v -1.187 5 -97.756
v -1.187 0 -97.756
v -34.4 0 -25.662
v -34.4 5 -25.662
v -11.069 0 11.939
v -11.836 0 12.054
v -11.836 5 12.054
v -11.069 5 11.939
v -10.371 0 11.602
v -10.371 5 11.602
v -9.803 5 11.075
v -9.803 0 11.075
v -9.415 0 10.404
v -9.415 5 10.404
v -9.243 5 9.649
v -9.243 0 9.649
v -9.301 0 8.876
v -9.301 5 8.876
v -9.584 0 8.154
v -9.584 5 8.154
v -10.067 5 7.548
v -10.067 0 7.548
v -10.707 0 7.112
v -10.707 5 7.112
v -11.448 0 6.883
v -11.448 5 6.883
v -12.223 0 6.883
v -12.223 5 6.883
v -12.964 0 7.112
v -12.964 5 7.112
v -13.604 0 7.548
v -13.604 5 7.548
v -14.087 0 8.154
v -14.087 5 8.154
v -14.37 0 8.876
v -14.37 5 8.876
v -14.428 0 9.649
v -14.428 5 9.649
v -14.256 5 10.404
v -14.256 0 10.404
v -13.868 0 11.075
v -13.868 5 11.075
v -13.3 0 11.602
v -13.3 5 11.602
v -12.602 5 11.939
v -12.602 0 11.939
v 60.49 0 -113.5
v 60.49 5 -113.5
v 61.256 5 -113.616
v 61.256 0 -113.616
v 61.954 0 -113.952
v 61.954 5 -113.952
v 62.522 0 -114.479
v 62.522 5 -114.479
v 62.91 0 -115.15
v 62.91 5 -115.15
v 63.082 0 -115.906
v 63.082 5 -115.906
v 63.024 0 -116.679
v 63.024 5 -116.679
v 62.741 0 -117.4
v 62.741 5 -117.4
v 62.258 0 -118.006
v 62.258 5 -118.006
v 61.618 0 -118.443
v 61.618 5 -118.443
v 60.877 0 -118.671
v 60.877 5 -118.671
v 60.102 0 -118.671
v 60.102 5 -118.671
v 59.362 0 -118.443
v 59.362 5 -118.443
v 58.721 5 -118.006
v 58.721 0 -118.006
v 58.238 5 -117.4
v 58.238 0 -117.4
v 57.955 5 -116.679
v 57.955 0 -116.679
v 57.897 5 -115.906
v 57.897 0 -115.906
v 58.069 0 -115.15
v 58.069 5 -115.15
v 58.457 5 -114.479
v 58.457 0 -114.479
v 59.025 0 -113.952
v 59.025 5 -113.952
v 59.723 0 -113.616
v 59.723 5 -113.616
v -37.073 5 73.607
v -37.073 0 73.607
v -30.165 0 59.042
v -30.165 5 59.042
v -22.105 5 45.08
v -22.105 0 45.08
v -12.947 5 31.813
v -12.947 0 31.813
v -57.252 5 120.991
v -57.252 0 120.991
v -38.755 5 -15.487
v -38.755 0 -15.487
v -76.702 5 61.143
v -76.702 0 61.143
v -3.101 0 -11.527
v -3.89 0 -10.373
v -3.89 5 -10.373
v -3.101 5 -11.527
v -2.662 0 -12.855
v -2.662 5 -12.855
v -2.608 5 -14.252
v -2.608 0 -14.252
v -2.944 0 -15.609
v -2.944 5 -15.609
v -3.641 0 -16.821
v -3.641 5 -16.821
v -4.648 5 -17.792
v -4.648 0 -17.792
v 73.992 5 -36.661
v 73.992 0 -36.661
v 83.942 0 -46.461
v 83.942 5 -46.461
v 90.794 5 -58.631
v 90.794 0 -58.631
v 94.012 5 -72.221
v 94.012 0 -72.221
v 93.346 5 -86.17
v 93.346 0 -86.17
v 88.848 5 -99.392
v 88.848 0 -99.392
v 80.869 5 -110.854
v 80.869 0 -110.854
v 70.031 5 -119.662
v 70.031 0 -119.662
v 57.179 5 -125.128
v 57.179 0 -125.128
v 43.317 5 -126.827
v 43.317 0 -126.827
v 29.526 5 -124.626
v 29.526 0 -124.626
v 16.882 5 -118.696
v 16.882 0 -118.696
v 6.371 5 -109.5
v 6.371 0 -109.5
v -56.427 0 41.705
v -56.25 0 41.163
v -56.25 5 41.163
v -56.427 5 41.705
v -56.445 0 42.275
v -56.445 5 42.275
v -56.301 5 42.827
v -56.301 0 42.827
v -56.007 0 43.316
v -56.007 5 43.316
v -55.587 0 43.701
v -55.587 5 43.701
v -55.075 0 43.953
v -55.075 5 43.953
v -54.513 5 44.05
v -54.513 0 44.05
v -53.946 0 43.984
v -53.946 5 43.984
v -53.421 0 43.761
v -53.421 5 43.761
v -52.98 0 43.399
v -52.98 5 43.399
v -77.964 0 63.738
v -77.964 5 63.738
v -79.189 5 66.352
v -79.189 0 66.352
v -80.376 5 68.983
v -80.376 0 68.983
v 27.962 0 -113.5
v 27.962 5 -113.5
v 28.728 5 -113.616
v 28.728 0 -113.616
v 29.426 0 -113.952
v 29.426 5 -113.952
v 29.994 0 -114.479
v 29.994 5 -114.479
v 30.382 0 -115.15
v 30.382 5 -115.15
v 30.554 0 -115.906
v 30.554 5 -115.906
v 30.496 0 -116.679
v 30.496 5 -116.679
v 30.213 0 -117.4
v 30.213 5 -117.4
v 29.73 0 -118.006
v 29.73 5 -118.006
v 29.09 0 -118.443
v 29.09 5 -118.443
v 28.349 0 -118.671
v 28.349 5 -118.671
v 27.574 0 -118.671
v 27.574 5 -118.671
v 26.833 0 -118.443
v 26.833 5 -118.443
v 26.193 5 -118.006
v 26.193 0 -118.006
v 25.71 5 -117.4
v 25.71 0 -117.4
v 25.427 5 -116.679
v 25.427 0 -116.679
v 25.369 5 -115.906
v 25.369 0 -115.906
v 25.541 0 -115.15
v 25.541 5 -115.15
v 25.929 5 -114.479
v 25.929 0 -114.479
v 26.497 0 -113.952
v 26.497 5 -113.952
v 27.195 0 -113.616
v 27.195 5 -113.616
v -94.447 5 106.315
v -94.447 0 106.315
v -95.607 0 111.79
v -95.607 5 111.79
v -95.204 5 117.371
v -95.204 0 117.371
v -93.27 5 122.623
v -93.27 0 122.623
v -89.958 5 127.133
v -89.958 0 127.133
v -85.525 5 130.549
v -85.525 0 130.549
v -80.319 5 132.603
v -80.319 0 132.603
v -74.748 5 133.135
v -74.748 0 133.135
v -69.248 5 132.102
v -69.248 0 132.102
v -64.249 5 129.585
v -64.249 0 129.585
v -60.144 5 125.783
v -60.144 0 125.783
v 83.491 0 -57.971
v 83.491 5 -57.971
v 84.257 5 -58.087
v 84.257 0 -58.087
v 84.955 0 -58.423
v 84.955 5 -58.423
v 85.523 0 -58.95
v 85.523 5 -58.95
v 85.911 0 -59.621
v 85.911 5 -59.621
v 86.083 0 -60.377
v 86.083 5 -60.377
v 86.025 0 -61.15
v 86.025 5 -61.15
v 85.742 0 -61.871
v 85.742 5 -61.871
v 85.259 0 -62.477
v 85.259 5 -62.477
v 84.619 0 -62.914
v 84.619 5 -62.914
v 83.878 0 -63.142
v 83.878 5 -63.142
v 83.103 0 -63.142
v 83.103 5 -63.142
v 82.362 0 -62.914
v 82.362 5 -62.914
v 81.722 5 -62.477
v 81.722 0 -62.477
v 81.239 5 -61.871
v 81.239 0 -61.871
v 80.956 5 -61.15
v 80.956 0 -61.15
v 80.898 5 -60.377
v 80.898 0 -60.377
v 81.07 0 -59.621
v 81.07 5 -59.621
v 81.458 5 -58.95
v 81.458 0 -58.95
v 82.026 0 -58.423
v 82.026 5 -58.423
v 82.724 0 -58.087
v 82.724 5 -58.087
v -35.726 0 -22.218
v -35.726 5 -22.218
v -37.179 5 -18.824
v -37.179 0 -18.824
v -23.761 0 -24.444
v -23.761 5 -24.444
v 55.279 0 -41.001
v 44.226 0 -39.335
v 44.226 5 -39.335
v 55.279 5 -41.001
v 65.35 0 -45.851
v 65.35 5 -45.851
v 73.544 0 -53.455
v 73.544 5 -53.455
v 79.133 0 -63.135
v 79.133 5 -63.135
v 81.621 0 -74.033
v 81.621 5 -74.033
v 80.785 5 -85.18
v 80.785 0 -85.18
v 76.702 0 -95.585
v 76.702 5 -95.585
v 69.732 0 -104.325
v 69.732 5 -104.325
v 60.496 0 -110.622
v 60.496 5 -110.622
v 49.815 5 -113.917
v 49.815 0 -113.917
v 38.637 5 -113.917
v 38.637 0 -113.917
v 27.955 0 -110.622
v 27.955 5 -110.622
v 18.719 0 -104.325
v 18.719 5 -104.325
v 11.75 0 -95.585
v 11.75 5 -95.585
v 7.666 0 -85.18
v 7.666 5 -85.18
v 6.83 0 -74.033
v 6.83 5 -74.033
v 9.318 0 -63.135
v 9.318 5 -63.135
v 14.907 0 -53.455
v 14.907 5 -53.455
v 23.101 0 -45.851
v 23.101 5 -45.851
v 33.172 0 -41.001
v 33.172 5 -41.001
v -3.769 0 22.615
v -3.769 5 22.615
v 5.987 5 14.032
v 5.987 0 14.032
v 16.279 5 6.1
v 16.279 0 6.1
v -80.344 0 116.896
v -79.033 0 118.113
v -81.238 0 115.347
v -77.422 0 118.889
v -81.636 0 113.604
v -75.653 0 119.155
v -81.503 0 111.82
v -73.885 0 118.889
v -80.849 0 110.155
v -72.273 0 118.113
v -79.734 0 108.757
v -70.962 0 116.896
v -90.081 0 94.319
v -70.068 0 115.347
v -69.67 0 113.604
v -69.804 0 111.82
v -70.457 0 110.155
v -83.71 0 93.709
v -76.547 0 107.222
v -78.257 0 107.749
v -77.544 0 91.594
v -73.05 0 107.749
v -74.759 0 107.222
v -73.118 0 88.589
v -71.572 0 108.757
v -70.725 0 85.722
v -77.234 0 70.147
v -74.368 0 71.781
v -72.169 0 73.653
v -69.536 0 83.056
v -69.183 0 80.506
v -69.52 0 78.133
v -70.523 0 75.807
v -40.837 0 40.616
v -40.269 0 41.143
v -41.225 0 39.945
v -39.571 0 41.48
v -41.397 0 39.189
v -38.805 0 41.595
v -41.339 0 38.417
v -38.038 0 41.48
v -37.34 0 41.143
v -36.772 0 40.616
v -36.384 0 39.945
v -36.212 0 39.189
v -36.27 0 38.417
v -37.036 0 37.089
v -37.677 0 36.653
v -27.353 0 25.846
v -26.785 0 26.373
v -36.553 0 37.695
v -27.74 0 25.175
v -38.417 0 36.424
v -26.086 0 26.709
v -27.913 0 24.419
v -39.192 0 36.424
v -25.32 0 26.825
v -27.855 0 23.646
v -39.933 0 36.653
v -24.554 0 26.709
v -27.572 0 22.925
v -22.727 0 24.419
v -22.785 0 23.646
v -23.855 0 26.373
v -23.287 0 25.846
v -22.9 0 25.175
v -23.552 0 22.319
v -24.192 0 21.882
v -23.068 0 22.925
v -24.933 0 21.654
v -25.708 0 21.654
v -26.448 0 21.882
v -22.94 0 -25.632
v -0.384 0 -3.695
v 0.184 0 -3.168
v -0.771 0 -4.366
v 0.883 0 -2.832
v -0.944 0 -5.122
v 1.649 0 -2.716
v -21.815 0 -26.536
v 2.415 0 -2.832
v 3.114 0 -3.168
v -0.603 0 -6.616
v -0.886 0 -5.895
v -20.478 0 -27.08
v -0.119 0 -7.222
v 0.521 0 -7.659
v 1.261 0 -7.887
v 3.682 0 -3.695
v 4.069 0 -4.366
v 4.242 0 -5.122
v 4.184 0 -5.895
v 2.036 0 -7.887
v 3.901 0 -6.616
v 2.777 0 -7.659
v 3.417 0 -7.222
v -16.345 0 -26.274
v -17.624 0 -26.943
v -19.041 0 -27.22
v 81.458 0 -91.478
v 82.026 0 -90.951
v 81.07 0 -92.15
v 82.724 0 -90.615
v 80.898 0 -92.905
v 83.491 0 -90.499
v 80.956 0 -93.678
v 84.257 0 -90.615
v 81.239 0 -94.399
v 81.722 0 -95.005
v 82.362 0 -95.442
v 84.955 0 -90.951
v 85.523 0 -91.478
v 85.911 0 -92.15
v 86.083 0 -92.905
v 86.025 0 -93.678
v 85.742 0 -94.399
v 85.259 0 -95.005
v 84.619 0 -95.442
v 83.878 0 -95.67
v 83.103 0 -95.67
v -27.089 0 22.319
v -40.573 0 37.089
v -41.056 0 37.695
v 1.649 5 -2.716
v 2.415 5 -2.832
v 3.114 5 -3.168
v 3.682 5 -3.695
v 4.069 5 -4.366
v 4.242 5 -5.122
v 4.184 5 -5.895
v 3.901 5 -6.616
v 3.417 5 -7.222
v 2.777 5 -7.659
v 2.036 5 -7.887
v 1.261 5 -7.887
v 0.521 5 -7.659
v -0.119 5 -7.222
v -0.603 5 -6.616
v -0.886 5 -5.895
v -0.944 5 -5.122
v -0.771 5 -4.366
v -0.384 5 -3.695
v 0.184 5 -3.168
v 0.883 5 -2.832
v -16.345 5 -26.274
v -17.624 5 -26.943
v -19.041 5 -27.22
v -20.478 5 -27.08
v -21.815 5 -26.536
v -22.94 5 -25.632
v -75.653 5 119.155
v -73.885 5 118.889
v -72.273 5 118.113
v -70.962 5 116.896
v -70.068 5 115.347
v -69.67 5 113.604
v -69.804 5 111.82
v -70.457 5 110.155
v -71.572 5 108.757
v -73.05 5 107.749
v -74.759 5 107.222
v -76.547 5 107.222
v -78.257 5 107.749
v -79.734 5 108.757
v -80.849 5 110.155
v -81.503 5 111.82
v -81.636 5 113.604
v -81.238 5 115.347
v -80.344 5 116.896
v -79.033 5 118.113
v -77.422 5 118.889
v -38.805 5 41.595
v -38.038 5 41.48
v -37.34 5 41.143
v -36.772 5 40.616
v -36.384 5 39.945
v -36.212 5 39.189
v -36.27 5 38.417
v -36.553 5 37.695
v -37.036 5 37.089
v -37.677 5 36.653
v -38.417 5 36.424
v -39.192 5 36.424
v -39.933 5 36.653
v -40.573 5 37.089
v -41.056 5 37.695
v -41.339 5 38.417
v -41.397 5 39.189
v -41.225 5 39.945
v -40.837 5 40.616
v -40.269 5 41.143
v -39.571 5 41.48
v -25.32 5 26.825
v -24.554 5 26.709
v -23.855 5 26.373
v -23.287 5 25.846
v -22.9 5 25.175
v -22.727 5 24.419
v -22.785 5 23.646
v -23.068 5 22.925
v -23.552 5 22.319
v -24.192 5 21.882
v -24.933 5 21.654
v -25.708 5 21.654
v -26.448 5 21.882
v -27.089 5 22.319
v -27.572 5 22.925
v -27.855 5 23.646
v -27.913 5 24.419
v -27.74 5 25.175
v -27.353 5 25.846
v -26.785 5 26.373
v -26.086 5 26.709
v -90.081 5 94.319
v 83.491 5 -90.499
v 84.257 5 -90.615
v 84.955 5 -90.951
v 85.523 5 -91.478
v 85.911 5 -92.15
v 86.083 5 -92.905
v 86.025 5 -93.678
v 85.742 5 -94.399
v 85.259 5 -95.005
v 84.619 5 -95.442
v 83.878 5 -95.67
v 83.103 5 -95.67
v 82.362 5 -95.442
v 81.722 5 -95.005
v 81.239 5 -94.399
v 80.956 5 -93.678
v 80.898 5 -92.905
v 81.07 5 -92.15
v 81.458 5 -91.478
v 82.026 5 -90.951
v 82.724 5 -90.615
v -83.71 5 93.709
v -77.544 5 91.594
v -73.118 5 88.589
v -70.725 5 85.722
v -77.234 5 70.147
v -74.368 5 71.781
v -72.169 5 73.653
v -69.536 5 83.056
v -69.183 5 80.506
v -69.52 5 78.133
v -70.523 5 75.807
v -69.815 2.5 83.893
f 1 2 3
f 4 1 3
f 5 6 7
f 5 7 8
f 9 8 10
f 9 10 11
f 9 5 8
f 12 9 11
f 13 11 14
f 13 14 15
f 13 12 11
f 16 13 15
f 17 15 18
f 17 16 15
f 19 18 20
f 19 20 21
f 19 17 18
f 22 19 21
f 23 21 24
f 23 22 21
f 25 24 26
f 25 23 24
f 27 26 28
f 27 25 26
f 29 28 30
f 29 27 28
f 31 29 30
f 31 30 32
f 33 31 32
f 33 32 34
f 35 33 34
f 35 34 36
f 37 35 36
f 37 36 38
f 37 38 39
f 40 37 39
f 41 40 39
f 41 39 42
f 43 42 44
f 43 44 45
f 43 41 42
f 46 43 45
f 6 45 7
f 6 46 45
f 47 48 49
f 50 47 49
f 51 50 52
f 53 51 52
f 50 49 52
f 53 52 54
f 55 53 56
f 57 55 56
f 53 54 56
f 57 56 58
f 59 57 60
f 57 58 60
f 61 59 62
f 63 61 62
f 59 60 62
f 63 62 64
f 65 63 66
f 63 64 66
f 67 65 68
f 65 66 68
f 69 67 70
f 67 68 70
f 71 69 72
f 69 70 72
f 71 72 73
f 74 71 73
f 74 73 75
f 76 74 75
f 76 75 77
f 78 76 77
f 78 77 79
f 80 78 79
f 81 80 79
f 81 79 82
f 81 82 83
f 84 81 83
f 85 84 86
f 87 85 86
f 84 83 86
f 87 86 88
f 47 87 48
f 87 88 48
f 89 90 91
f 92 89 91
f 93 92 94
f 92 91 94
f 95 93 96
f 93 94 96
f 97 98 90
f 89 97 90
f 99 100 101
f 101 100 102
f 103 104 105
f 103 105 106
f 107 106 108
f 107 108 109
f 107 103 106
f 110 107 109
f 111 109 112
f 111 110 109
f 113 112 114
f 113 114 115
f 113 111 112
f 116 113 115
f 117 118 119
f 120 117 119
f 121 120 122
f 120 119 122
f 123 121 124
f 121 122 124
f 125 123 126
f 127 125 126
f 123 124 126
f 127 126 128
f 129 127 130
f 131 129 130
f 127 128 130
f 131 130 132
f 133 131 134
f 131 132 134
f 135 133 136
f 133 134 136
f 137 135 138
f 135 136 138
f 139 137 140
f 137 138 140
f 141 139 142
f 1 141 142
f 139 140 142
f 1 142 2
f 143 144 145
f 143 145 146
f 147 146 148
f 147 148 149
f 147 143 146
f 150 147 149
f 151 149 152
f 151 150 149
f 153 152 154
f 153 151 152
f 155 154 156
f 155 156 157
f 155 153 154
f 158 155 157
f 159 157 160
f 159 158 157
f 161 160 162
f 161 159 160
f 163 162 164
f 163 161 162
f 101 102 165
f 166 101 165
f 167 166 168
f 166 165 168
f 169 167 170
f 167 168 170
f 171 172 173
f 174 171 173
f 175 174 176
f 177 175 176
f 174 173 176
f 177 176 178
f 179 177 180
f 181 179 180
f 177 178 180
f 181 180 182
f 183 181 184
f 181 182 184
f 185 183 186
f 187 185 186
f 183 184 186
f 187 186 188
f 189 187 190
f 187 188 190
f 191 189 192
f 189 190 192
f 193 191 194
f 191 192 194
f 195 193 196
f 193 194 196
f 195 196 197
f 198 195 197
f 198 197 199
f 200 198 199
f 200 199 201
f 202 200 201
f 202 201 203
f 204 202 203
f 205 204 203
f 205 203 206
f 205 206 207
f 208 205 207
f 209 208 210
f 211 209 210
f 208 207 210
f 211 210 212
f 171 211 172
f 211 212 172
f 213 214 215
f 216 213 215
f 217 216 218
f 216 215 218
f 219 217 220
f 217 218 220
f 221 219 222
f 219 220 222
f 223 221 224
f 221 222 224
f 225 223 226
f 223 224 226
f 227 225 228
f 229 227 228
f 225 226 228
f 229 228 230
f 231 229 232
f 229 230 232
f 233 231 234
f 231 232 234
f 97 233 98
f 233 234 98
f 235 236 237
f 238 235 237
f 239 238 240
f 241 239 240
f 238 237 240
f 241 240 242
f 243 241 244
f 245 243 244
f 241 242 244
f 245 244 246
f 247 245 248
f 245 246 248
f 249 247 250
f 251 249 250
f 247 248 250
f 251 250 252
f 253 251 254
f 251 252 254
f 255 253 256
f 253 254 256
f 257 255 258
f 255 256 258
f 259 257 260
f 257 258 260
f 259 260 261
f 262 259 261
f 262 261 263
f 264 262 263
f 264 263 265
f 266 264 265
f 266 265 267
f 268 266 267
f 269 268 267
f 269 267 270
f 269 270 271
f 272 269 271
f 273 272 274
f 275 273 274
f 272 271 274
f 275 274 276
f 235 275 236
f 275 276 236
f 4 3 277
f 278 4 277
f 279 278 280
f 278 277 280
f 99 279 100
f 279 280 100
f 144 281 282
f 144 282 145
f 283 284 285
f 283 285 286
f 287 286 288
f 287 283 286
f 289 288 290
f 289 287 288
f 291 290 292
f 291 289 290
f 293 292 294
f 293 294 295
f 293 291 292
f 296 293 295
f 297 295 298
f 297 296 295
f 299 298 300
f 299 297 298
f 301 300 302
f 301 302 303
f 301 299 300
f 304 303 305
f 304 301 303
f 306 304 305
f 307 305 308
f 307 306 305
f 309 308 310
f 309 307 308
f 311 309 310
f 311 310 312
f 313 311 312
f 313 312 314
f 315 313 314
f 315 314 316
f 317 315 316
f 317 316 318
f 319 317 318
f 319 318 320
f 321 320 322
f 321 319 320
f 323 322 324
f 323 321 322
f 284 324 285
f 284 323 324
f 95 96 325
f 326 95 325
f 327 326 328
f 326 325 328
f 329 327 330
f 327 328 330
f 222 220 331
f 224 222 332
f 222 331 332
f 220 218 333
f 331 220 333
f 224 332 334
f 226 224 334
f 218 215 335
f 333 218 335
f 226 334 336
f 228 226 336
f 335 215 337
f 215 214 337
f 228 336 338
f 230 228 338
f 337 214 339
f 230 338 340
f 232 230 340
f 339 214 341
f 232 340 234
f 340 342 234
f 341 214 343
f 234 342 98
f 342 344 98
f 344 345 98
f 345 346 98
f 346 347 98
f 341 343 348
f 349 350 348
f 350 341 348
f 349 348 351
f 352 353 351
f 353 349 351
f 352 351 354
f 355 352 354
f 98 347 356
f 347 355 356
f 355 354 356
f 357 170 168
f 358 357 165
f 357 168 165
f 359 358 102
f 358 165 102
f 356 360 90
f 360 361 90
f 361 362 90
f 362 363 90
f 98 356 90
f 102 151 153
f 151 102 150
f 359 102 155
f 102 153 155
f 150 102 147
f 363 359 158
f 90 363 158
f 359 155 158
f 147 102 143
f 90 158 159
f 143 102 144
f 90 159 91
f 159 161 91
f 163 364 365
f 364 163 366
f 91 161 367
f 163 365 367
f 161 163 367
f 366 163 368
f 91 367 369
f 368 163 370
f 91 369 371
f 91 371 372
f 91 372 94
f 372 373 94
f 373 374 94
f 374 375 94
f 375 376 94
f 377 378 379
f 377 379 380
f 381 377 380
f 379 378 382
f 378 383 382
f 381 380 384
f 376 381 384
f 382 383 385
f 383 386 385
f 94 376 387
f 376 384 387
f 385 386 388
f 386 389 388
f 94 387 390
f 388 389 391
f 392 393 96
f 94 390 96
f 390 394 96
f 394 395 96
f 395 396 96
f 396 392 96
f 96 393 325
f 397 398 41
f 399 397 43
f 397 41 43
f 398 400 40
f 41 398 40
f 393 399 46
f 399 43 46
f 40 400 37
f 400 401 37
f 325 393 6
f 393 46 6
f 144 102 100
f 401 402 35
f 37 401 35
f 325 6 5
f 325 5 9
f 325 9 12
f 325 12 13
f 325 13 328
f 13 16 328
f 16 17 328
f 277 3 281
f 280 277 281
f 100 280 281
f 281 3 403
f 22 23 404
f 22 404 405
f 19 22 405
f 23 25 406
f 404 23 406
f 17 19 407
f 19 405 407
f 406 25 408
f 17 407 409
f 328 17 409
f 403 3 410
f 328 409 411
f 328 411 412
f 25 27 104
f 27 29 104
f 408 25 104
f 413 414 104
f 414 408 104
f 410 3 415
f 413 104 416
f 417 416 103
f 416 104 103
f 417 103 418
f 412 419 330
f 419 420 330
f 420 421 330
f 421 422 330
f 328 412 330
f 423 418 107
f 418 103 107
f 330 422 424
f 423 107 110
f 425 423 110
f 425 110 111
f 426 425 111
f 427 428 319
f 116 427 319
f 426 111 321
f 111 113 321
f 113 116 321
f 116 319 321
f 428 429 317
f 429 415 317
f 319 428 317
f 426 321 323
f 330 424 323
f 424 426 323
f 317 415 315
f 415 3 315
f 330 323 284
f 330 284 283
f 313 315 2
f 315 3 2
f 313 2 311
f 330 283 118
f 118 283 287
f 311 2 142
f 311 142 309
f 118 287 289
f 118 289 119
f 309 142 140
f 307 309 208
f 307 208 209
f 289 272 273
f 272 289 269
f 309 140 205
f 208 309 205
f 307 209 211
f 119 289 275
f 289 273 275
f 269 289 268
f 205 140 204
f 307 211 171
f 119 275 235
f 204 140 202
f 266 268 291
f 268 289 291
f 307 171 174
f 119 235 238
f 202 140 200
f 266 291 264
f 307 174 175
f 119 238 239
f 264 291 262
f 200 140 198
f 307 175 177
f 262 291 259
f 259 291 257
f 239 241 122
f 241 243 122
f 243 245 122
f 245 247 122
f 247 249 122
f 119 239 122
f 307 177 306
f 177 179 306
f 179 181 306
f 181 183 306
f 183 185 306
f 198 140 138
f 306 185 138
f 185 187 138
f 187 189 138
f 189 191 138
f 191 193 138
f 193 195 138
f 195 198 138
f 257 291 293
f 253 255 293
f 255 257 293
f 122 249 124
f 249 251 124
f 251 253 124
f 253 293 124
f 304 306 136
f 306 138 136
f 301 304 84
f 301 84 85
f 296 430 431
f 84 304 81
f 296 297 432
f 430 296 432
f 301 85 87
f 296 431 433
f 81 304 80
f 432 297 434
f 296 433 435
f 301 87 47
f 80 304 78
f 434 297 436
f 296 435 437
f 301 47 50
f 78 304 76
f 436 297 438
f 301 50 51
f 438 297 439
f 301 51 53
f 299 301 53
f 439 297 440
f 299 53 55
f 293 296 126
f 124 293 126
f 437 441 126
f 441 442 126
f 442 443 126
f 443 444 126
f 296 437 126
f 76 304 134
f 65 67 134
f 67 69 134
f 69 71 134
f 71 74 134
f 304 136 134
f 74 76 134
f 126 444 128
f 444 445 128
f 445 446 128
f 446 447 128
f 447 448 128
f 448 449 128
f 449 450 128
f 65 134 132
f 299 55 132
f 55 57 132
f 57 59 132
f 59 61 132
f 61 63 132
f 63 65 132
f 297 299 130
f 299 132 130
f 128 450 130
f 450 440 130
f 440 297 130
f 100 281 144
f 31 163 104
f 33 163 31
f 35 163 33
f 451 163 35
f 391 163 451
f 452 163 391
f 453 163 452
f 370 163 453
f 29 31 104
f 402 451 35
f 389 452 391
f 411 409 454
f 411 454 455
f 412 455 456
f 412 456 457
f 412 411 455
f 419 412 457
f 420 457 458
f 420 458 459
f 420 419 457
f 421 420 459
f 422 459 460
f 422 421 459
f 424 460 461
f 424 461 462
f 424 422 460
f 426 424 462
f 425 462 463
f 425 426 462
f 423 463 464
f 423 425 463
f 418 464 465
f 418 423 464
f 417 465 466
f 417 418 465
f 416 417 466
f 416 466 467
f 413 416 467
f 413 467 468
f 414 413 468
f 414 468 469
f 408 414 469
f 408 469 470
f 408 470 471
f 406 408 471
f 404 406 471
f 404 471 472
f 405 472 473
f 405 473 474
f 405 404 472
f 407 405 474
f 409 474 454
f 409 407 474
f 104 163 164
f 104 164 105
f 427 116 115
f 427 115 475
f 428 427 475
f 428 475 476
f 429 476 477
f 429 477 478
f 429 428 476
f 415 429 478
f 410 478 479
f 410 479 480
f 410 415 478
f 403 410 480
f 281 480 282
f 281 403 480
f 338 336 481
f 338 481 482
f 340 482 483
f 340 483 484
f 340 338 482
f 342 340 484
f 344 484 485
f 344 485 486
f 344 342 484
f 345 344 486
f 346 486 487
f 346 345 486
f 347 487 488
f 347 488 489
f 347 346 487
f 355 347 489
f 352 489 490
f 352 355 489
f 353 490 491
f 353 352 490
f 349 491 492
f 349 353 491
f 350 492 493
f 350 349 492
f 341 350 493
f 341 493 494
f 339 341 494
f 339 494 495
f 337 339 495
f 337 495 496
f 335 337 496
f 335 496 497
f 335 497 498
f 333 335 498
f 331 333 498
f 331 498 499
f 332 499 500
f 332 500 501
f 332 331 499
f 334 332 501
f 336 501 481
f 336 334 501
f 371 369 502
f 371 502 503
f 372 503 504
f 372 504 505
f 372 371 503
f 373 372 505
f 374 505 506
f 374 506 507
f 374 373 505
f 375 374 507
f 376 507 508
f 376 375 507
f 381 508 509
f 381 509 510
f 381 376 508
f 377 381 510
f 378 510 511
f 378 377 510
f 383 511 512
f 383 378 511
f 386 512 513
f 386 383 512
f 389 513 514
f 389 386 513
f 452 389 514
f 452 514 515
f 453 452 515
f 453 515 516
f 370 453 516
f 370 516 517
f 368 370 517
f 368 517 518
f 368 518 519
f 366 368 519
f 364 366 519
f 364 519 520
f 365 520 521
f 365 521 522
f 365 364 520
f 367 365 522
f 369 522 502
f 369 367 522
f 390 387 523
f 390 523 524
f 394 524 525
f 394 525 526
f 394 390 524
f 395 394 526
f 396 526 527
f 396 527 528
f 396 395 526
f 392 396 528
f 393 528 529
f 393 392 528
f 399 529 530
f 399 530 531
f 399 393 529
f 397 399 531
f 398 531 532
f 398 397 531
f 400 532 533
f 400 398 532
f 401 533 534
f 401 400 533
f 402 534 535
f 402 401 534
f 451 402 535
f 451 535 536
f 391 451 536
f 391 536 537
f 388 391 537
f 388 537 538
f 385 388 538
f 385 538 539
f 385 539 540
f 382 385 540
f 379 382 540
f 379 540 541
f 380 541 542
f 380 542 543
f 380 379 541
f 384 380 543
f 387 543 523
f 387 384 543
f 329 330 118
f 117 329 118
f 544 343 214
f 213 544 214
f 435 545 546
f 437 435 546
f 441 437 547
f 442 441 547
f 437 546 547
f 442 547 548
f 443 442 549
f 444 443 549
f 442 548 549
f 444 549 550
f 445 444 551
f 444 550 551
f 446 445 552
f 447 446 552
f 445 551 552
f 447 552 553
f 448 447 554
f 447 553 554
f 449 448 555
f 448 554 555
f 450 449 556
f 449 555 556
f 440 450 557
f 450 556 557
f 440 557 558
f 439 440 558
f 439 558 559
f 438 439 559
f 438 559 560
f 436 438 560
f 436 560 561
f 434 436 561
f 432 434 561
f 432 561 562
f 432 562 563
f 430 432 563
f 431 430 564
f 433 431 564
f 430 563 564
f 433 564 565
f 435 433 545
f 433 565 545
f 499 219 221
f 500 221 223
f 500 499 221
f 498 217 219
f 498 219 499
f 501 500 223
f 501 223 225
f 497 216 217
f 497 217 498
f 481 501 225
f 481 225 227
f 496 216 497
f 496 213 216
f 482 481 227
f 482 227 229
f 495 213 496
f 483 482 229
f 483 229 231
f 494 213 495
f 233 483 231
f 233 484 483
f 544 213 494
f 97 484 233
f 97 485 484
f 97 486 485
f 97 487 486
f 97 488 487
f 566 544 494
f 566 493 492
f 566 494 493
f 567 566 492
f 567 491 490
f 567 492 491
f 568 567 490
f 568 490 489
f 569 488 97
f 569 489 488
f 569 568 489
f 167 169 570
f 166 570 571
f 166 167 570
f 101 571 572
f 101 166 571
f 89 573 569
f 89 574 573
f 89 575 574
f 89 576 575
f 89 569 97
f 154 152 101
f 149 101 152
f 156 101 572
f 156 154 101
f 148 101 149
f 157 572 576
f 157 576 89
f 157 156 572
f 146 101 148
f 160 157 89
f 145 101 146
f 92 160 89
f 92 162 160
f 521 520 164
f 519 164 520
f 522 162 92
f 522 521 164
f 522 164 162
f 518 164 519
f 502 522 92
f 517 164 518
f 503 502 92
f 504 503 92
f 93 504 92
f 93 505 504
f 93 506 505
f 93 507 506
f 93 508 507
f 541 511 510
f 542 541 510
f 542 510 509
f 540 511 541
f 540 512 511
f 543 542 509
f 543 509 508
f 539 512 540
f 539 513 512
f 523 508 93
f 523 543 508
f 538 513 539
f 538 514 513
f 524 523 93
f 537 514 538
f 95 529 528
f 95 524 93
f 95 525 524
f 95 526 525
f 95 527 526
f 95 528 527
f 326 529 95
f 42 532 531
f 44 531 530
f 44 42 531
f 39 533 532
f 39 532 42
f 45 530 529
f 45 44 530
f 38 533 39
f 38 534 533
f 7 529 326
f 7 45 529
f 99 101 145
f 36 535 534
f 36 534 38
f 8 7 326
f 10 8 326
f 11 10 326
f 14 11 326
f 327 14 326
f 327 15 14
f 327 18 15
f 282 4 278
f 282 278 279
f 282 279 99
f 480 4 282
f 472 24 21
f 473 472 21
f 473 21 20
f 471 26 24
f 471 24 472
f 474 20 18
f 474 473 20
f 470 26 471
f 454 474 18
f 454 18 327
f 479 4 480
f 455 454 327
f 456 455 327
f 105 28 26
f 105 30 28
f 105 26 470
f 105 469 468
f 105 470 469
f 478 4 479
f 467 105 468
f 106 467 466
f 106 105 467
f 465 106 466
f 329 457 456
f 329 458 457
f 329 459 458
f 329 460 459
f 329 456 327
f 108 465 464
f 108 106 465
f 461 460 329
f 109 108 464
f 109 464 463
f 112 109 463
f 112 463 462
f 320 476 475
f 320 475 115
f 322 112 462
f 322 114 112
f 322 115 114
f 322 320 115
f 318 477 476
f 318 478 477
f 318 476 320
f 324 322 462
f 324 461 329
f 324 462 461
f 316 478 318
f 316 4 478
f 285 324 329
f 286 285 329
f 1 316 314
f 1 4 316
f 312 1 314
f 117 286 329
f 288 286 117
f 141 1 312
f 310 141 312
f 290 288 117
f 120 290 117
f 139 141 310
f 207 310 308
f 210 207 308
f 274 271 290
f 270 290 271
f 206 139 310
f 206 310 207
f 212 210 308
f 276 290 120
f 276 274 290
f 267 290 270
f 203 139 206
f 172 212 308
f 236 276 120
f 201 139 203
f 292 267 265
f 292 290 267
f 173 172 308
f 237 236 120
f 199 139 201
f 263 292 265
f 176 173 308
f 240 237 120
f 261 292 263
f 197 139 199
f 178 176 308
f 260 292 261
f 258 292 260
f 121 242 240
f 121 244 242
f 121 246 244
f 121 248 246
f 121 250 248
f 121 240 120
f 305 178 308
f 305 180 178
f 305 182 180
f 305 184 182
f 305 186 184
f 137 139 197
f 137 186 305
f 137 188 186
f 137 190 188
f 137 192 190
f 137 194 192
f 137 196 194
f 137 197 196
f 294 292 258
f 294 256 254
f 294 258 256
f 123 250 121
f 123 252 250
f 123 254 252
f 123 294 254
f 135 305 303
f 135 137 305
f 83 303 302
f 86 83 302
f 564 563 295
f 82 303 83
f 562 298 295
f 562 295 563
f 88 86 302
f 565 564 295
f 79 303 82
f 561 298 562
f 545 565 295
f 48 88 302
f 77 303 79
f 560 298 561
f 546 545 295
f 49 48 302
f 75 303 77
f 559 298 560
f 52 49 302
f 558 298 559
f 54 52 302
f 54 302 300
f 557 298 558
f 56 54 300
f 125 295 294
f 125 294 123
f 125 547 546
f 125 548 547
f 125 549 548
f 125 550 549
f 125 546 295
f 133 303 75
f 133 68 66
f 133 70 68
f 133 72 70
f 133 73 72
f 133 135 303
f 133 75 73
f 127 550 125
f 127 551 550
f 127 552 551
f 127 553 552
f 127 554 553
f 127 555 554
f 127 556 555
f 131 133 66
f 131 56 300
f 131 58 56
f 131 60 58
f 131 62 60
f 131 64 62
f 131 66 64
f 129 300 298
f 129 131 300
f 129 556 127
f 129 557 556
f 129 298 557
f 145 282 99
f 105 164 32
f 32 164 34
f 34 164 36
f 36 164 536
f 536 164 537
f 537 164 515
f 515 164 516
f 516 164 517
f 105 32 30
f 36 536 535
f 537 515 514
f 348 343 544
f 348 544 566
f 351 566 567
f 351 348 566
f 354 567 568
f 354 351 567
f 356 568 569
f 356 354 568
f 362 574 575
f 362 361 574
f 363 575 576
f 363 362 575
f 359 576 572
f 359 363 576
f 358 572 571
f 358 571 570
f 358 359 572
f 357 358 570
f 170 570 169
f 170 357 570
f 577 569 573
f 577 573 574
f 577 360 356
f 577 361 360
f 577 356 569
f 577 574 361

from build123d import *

# Parameters (mm, degrees)
SKETCH_4_R          = 6
SKETCH_4_R_2        = 37.5
SKETCH_4_R_3        = 2.6
EXTRUDE_1_DEPTH     = 5
SKETCH_5_R          = 2.6
CUT_EXTRUDE_1_DEPTH = 5


with BuildPart() as part:
    # 草图4 → 凸台-拉伸1 (new body)
    with BuildSketch(Plane(origin=(0, 0, 0), x_dir=(1, 0, 0), z_dir=(0, 1, 0))):
        with BuildLine():
            Line((-1.187051208, 97.756382931), (-34.399966732, 25.661973505))
            ThreePointArc((-34.399966732, 25.661973505), (-36.436671314, 20.514211828), (-38.755127266, 15.487047832))
            Line((-38.755127266, 15.487047832), (-76.702239109, -61.142758857))
            ThreePointArc((-76.702239109, -61.142758857), (-78.581308529, -65.042906811), (-80.375519882, -68.982813099))
            add(Edge.make_bspline(
                [(-90.080878885, -94.318710442), (-73.900652668, -94.557787877), (-69.815317221, -83.892995419), (-65.729981774, -73.228202961), (-80.375519882, -68.982813099)],
                knots=[1.469085418, 1.469085418, 1.469085418, 2.850930512, 2.850930512, 4.232775606, 4.232775606, 4.232775606], degree=2, weights=[1, 0.770658452, 1, 0.770658452, 1]))
            Line((-90.080878885, -94.318710442), (-94.447090172, -106.314777361))
            ThreePointArc((-94.447090172, -106.314777361), (-82.99415066, -131.759238863), (-57.252299544, -120.991344654))
            Line((-57.252299544, -120.991344654), (-37.073490807, -73.607319444))
            ThreePointArc((-37.073490807, -73.607319444), (-26.275484562, -51.979867968), (-12.947104361, -31.813116187))
            ThreePointArc((-12.947104361, -31.813116187), (1.038966567, -18.243877447), (16.279183802, -6.100146611))
            Line((16.279183802, -6.100146611), (73.992008997, 36.661223905))
            ThreePointArc((73.992008997, 36.661223905), (75.759044699, 115.638002674), (-1.187051208, 97.756382931))
        make_face()
        with Locations(Location((-75.653237756, -113.155180227, 0), (0, 0, 270))):
            Circle(SKETCH_4_R, mode=Mode.SUBTRACT)
        with Locations(Location((44.225629177, 76.835377691, 0), (0, 0, 270))):
            Circle(SKETCH_4_R_2, mode=Mode.SUBTRACT)
        with Locations(Location((-38.804653771, -38.995185245, 0), (0, 0, 270))):
            Circle(SKETCH_4_R_3, mode=Mode.SUBTRACT)
        with Locations(Location((-11.835571633, -9.45422032, 0), (0, 0, 270))):
            Circle(SKETCH_4_R_3, mode=Mode.SUBTRACT)
        with Locations(Location((-25.320112702, -24.224702783, 0), (0, 0, 270))):
            Circle(SKETCH_4_R_3, mode=Mode.SUBTRACT)
        with Locations(Location((1.648969436, 5.316262142, 0), (0, 0, 270))):
            Circle(SKETCH_4_R_3, mode=Mode.SUBTRACT)
        with BuildLine():
            Line((-23.760910885, 24.444490758), (-56.249753951, -41.162972966))
            ThreePointArc((-56.249753951, -41.162972966), (-55.586524246, -43.701342116), (-52.980423674, -43.398965873))
            Line((-52.980423674, -43.398965873), (-3.889961488, 10.372965042))
            ThreePointArc((-3.889961488, 10.372965042), (-2.608449448, 14.252041571), (-4.647570443, 17.792026514))
            Line((-4.647570443, 17.792026514), (-16.345194148, 26.273569961))
            ThreePointArc((-16.345194148, 26.273569961), (-20.477567373, 27.080159725), (-23.760910885, 24.444490758))
        make_face(mode=Mode.SUBTRACT)
    extrude(amount=EXTRUDE_1_DEPTH)

    # 草图5 → 切除-拉伸1 (cut)
    with BuildSketch(Plane(origin=(0, 5, 0), x_dir=(1, 0, 0), z_dir=(0, 1, 0))):
        with Locations(Location((60.489675053, 116.100257823, 0), (0, 0, 270))):
            Circle(SKETCH_5_R)
        with Locations(Location((83.490509309, 93.099423567, 0), (0, 0, 270))):
            Circle(SKETCH_5_R)
        with Locations(Location((83.490509309, 60.571331816, 0), (0, 0, 270))):
            Circle(SKETCH_5_R)
        with Locations(Location((27.961583302, 116.100257823, 0), (0, 0, 270))):
            Circle(SKETCH_5_R)
    extrude(amount=-CUT_EXTRUDE_1_DEPTH, mode=Mode.SUBTRACT)


solid = part.part
